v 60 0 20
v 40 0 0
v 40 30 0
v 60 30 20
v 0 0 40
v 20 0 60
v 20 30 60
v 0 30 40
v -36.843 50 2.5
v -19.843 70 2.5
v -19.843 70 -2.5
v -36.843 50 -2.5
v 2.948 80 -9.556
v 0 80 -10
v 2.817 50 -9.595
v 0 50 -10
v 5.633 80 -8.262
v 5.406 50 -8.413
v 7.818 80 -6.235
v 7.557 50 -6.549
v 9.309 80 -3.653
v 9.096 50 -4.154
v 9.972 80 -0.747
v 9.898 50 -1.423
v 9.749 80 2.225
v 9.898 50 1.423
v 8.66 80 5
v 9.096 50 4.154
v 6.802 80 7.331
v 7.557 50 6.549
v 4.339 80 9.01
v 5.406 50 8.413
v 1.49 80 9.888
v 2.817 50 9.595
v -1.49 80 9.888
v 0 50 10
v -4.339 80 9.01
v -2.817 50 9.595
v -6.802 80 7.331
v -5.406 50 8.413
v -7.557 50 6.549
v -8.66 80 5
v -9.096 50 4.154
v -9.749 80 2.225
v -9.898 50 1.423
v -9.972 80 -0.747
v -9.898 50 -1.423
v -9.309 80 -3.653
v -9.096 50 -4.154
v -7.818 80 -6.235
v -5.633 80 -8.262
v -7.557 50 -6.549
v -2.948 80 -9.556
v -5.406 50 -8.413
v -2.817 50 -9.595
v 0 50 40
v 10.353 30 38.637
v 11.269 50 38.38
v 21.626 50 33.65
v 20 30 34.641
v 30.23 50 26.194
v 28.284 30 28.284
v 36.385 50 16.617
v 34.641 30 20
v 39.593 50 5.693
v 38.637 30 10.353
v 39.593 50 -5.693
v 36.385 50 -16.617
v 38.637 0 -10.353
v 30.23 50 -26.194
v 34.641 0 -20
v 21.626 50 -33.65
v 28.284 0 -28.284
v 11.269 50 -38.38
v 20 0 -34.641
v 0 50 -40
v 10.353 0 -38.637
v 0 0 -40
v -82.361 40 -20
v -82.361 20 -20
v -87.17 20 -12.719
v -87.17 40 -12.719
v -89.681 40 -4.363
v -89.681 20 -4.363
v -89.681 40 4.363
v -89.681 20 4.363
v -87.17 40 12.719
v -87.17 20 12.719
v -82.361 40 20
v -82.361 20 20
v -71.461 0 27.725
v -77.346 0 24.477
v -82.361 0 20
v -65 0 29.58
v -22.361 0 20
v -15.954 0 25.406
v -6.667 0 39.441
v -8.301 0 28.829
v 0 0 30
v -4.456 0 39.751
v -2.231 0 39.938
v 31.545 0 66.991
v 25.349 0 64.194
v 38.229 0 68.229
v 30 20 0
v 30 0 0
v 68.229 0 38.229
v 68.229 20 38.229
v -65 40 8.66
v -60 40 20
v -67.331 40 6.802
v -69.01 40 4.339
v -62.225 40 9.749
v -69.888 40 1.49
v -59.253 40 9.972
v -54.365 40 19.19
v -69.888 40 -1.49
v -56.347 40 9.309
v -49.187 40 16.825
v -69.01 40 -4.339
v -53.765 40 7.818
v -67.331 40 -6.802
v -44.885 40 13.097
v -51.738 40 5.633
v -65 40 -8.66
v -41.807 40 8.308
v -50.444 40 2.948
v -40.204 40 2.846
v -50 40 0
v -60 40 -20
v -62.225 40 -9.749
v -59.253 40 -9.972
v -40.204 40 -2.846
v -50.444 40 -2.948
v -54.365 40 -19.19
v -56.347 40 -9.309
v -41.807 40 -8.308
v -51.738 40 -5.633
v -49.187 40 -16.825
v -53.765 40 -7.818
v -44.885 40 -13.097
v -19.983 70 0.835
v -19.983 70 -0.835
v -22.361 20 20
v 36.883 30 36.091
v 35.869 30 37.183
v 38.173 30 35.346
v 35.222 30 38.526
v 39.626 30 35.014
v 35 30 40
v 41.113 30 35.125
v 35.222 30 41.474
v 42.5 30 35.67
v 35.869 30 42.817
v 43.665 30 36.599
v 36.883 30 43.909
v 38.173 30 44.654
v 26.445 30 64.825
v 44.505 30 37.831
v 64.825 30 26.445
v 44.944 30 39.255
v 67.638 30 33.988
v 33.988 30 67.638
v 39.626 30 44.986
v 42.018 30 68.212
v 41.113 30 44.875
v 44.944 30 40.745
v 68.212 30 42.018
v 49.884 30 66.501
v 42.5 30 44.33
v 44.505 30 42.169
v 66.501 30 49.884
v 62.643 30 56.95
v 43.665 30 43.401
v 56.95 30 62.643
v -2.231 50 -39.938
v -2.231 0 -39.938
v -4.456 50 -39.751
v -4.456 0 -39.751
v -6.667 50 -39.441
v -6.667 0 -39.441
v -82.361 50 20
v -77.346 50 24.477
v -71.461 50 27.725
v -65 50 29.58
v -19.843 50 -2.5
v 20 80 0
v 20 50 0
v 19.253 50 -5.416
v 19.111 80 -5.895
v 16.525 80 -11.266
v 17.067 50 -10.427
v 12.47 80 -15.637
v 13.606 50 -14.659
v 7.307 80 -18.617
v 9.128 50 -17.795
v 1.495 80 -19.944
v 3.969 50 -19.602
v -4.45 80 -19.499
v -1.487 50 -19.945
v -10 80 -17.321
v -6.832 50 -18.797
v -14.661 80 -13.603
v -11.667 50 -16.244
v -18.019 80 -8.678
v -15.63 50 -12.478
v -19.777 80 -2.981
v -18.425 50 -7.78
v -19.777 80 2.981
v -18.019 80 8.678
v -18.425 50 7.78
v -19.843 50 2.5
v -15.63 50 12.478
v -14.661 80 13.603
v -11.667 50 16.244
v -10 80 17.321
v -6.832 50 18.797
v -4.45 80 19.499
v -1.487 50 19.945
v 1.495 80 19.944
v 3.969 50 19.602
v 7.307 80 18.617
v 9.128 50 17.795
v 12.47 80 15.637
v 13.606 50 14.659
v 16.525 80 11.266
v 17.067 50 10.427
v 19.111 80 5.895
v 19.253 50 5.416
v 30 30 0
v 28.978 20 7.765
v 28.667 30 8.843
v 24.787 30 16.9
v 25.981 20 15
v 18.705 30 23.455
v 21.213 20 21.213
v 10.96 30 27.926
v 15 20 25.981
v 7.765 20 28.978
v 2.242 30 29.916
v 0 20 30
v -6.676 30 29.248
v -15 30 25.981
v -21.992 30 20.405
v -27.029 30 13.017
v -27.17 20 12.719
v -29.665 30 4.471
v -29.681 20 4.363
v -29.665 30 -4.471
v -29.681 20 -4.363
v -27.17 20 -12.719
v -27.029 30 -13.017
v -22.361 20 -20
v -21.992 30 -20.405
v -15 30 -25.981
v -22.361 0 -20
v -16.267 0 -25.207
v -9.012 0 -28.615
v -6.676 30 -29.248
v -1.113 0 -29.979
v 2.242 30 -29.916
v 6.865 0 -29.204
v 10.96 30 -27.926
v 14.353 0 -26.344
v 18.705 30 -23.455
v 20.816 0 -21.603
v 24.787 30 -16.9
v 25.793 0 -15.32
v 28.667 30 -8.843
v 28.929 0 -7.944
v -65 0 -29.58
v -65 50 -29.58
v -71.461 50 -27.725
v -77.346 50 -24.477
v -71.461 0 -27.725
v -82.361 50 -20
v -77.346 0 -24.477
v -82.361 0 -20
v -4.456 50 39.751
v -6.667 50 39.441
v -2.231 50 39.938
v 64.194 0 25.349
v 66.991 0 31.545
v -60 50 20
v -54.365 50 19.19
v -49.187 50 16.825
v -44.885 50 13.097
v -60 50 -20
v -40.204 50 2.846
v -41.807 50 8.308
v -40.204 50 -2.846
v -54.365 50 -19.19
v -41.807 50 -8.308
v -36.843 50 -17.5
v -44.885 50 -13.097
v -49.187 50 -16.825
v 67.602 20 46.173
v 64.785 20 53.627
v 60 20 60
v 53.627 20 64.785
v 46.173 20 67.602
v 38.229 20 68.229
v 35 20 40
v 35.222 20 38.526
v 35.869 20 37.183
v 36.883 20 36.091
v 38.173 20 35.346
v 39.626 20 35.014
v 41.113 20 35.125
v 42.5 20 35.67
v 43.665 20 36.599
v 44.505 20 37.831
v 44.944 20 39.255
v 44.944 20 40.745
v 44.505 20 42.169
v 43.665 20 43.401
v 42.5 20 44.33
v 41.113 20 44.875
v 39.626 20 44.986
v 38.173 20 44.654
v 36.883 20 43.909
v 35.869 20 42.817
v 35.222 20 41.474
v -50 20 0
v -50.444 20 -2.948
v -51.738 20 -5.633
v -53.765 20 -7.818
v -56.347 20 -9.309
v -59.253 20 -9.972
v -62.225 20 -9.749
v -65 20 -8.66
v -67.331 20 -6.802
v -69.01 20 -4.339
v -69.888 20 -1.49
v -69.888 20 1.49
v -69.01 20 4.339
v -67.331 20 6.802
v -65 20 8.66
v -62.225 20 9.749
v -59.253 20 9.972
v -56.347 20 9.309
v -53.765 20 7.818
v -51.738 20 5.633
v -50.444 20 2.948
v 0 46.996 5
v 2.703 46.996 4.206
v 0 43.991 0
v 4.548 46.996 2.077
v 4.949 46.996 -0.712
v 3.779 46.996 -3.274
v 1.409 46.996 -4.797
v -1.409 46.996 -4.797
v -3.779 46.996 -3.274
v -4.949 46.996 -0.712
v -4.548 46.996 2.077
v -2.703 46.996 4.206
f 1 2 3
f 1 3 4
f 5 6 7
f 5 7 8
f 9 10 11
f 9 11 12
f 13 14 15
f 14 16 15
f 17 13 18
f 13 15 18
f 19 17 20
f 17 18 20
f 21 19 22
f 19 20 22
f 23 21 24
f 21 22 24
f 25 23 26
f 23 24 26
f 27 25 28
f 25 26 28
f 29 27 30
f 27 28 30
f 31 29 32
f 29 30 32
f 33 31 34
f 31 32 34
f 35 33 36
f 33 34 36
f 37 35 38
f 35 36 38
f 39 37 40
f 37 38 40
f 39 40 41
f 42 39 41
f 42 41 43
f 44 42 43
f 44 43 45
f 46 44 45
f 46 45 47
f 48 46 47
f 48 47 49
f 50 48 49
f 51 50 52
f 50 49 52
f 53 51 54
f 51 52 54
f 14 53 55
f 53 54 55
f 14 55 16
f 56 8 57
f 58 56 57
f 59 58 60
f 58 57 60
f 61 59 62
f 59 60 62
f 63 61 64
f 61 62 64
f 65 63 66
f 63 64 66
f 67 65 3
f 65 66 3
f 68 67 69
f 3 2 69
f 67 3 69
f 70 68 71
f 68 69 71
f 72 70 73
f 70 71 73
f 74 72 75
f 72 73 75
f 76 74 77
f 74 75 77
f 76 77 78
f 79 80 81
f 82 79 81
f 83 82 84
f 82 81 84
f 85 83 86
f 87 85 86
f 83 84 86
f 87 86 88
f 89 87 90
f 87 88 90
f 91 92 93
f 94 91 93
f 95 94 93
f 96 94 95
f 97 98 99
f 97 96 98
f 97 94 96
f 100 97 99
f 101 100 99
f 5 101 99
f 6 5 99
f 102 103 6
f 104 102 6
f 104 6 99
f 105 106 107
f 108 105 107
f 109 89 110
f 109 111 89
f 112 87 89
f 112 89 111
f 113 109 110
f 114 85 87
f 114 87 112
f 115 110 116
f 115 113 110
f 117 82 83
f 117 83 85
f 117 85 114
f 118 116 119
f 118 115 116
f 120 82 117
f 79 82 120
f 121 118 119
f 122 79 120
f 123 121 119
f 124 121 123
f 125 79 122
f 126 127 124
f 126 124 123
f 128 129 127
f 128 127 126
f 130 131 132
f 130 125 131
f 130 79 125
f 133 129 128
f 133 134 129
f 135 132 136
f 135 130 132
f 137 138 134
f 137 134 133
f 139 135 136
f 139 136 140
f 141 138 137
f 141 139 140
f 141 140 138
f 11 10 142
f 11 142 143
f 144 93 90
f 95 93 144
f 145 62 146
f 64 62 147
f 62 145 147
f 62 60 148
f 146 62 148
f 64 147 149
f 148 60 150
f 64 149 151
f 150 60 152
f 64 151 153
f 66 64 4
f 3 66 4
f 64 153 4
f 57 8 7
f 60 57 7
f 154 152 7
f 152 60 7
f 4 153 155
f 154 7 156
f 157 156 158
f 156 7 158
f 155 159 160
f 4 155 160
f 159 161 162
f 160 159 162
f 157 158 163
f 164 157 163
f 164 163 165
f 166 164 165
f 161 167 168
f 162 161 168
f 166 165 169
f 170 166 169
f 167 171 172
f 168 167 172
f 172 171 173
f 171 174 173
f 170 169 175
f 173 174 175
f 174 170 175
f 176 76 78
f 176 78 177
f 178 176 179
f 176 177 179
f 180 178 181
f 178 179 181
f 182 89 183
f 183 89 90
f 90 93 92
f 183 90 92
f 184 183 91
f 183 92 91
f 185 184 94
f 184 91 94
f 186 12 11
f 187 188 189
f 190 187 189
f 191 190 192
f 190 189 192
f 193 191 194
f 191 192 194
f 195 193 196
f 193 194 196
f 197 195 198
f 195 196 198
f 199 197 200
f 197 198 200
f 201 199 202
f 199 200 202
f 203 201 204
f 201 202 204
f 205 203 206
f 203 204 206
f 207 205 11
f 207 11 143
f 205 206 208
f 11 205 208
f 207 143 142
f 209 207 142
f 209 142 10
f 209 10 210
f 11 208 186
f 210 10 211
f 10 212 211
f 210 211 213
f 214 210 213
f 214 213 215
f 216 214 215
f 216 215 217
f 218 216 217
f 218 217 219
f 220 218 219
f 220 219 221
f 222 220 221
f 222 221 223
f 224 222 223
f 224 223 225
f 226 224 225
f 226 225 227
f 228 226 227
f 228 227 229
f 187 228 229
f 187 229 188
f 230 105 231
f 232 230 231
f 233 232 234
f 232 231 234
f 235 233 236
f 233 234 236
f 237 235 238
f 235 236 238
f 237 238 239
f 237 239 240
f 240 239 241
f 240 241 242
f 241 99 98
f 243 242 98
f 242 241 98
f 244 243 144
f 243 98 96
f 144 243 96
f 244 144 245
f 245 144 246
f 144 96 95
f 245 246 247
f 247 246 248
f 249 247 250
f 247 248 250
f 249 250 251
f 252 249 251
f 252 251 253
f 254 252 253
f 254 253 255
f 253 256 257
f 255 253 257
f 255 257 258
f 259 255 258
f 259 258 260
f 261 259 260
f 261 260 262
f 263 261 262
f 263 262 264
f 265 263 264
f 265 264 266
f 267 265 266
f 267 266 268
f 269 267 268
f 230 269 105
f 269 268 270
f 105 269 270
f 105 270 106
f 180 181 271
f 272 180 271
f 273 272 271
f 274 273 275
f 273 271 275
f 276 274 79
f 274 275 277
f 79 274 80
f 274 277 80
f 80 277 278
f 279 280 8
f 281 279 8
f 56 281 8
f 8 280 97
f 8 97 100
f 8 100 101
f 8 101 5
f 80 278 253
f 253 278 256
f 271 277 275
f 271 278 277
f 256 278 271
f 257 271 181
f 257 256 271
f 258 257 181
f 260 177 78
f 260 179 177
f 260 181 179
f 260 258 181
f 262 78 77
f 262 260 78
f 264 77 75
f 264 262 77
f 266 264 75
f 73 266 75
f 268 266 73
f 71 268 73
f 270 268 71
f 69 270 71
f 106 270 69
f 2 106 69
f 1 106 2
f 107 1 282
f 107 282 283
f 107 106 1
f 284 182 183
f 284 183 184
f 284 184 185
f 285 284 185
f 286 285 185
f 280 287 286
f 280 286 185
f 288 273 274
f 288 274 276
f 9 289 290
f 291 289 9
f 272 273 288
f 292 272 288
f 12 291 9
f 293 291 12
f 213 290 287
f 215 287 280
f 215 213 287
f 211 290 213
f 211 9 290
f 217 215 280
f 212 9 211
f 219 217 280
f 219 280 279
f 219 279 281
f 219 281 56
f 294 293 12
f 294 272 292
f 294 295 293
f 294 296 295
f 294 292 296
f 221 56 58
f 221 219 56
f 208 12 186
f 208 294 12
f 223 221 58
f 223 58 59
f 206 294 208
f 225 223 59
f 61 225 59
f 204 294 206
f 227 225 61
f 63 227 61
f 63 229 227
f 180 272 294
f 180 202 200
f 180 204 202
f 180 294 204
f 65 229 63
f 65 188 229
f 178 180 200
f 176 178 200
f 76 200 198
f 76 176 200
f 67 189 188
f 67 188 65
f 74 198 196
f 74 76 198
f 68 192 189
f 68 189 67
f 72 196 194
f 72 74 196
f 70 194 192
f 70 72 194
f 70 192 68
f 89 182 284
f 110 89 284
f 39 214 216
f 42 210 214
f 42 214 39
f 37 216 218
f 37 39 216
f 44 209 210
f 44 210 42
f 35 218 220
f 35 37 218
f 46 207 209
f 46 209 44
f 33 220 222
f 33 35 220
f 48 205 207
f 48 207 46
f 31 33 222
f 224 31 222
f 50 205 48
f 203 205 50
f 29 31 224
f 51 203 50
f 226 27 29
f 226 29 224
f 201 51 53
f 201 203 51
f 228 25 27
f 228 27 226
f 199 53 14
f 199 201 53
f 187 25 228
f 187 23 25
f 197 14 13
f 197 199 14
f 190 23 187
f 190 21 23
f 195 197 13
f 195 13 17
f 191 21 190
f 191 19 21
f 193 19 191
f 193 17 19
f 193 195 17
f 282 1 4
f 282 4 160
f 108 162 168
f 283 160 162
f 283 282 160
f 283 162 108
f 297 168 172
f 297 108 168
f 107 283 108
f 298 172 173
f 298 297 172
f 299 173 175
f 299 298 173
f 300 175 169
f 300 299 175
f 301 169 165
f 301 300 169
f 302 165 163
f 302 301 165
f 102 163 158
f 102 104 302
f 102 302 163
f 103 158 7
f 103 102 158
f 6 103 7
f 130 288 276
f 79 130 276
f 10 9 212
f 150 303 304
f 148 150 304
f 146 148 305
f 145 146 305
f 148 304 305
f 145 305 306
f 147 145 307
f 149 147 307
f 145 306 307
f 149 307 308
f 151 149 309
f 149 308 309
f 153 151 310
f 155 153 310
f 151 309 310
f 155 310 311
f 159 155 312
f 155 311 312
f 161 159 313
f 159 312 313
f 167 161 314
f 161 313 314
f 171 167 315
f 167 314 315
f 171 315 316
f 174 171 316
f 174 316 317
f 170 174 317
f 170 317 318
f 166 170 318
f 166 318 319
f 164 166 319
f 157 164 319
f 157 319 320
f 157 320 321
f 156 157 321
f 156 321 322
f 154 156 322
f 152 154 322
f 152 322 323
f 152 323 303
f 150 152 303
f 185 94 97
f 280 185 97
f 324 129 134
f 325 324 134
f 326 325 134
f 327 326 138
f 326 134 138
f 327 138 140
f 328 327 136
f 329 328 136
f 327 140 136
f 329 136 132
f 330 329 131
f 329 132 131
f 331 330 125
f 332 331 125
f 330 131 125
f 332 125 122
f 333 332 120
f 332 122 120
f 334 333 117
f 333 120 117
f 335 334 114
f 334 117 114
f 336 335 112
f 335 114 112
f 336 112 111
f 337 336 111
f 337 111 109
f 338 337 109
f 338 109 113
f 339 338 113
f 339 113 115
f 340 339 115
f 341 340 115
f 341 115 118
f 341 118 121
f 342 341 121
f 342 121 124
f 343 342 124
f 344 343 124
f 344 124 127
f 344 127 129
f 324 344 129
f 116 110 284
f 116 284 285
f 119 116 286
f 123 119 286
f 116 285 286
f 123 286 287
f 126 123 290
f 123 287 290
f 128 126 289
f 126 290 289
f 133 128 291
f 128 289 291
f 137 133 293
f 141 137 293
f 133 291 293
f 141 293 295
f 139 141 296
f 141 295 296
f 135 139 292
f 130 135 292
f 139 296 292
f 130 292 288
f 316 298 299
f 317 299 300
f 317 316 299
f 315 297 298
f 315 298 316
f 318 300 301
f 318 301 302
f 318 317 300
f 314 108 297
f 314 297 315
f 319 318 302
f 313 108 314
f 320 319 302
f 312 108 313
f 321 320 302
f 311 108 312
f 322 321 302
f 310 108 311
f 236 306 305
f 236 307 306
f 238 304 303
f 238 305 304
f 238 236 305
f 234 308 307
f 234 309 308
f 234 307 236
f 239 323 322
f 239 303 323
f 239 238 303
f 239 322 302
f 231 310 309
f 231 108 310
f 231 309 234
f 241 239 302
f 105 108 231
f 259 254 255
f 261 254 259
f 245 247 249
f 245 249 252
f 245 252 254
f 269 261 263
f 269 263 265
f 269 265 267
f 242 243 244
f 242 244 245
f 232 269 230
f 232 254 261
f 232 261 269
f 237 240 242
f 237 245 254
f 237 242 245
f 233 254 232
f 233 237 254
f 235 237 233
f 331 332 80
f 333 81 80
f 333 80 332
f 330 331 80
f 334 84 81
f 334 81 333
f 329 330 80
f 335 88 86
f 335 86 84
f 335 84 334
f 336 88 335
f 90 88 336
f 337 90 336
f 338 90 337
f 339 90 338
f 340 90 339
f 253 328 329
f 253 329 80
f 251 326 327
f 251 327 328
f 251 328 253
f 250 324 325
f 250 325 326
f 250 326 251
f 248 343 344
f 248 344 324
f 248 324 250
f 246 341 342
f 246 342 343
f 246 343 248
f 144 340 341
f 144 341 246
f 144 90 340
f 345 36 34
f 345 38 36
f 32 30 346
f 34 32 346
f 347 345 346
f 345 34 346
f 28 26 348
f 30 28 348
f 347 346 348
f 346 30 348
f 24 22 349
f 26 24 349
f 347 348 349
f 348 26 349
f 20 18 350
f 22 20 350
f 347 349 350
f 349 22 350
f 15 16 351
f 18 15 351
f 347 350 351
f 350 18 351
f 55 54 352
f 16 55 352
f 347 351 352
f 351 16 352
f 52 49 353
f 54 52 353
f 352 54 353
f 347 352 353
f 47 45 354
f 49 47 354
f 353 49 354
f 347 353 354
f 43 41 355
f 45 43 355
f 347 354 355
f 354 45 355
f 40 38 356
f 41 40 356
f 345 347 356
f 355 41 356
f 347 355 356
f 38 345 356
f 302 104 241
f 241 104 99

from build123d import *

# Parameters (mm, degrees)
BOSS_EXTRUDE1_DEPTH        = 50
SKETCH2_R                  = 30
CUT_EXTRUDE1_DEPTH         = 30
SKETCH3_R                  = 20
BOSS_EXTRUDE2_DEPTH        = 30
F_20_0MM_DOWEL_HOLE1_D     = 20
F_20_0MM_DOWEL_HOLE1_DEPTH = 30
F_20_0MM_DOWEL_HOLE1_TIP   = 6.00860619
SKETCH6_R                  = 10
CUT_EXTRUDE2_DEPTH         = 109
SKETCH7_R                  = 10
CUT_EXTRUDE3_DEPTH         = 10
BOSS_EXTRUDE3_DEPTH        = 30
SKETCH11_R                 = 5
CUT_EXTRUDE4_DEPTH         = 30
SKETCH13_R                 = 5
CUT_EXTRUDE5_DEPTH         = 20
SKETCH14_W                 = 17
SKETCH14_H                 = 5
BOSS_EXTRUDE4_DEPTH        = 20
SKETCH15_W                 = 91.222515674
SKETCH15_H                 = 40
CUT_EXTRUDE6_DEPTH         = 20
CUT_EXTRUDE7_DEPTH         = 20


with BuildPart() as part:
    # Sketch1 → Boss-Extrude1 (new body)
    with BuildSketch(Plane(origin=(0, 0, 0), x_dir=(1, 0, 0), z_dir=(0, 1, 0))):
        with BuildLine():
            Line((-6.666666667, 39.440531887), (-65, 29.580398915))
            ThreePointArc((-65, 29.580398915), (-74.494747679, 26.265991124), (-82.360679775, 20))
            ThreePointArc((-82.360679775, 20), (-90, 0), (-82.360679775, -20))
            ThreePointArc((-82.360679775, -20), (-74.494747679, -26.265991124), (-65, -29.580398915))
            Line((-65, -29.580398915), (-6.666666667, -39.440531887))
            ThreePointArc((-6.666666667, -39.440531887), (-3.345050411, -39.859887578), (0, -40))
            ThreePointArc((0, -40), (40, 0), (0, 40))
            ThreePointArc((0, 40), (-3.345050411, 39.859887578), (-6.666666667, 39.440531887))
        make_face()
    extrude(amount=BOSS_EXTRUDE1_DEPTH)

    # Sketch2 → Cut-Extrude1 (cut)
    with BuildSketch(Plane.XZ):
        Circle(SKETCH2_R)
    extrude(amount=-CUT_EXTRUDE1_DEPTH, mode=Mode.SUBTRACT)

    # Sketch3 → Boss-Extrude2 (add)
    with BuildSketch(Plane(origin=(0, 50, 0), x_dir=(1, 0, 0), z_dir=(0, 1, 0))):
        Circle(SKETCH3_R)
    extrude(amount=BOSS_EXTRUDE2_DEPTH)

    # Ø20.0mm Dowel Hole1
    with Locations(Plane.ZX.offset(80)):
        with Locations((0, 0)):
            Hole(F_20_0MM_DOWEL_HOLE1_D / 2, depth=F_20_0MM_DOWEL_HOLE1_DEPTH)
            with Locations((0, 0, -(F_20_0MM_DOWEL_HOLE1_DEPTH + F_20_0MM_DOWEL_HOLE1_TIP / 2))):  # 118° drill point
                Cone(0, F_20_0MM_DOWEL_HOLE1_D / 2, F_20_0MM_DOWEL_HOLE1_TIP, mode=Mode.SUBTRACT)

    # Sketch6 → Cut-Extrude2 (cut)
    with BuildSketch(Plane(origin=(0, 50, 0), x_dir=(1, 0, 0), z_dir=(0, 1, 0))):
        with Locations((-60, 0)):
            Circle(SKETCH6_R)
    extrude(amount=-CUT_EXTRUDE2_DEPTH, mode=Mode.SUBTRACT)

    # Sketch7 → Cut-Extrude3 (cut)
    with BuildSketch(Plane(origin=(0, 50, 0), x_dir=(1, 0, 0), z_dir=(0, 1, 0))):
        with BuildLine():
            ThreePointArc((-60, -20), (-40, 0), (-60, 20))
            Line((-60, 20), (-82.360679775, 20))
            ThreePointArc((-82.360679775, 20), (-90, 0), (-82.360679775, -20))
            Line((-82.360679775, -20), (-60, -20))
        make_face()
        with Locations((-60, 0)):
            Circle(SKETCH7_R, mode=Mode.SUBTRACT)
    extrude(amount=-CUT_EXTRUDE3_DEPTH, mode=Mode.SUBTRACT)

    # Sketch10 → Boss-Extrude3 (add)
    with BuildSketch(Plane.XZ):
        with BuildLine():
            Line((20, 60), (0, 40))
            ThreePointArc((0, 40), (28.284271247, 28.284271247), (40, 0))
            Line((40, 0), (60, 20))
            ThreePointArc((60, 20), (60, 60), (20, 60))
        make_face()
    extrude(amount=-BOSS_EXTRUDE3_DEPTH)

    # Sketch11 → Cut-Extrude4 (cut)
    with BuildSketch(Plane(origin=(0, 0, 0), x_dir=(-1, 0, 0), z_dir=(0, -1, 0))):
        with Locations((-40, -40)):
            Circle(SKETCH11_R)
    extrude(amount=-CUT_EXTRUDE4_DEPTH, mode=Mode.SUBTRACT)

    # Sketch13 → Cut-Extrude5 (cut)
    with BuildSketch(Plane(origin=(0, 0, 0), x_dir=(-1, 0, 0), z_dir=(0, -1, 0))):
        with BuildLine():
            ThreePointArc((-68.228756555, -38.228756555), (-60, -60), (-38.228756555, -68.228756555))
            Line((-38.228756555, -68.228756555), (0, -30))
            ThreePointArc((0, -30), (-21.213203436, -21.213203436), (-30, 0))
            Line((-30, 0), (-68.228756555, -38.228756555))
        make_face()
        with Locations((-40, -40)):
            Circle(SKETCH13_R, mode=Mode.SUBTRACT)
    extrude(amount=-CUT_EXTRUDE5_DEPTH, mode=Mode.SUBTRACT)

    # Sketch14 → Boss-Extrude4 (add)
    with BuildSketch(Plane(origin=(0, 50, 0), x_dir=(1, 0, 0), z_dir=(0, 1, 0))):
        with Locations((-28.343134833, 0)):
            Rectangle(SKETCH14_W, SKETCH14_H)
    extrude(amount=BOSS_EXTRUDE4_DEPTH)

    # Sketch15 → Cut-Extrude6 (cut)
    with BuildSketch(Plane.XZ):
        with Locations((-60, 0)):
            Rectangle(SKETCH15_W, SKETCH15_H)
    extrude(amount=-CUT_EXTRUDE6_DEPTH, mode=Mode.SUBTRACT)

    # Sketch16 → Cut-Extrude7 (cut)
    with BuildSketch(Plane.XY.offset(2.5)):
        Polygon((-19.843134833, 70), (-36.843134833, 50), (-36.843134833, 70), align=None)
    extrude(amount=-CUT_EXTRUDE7_DEPTH, mode=Mode.SUBTRACT)


solid = part.part
